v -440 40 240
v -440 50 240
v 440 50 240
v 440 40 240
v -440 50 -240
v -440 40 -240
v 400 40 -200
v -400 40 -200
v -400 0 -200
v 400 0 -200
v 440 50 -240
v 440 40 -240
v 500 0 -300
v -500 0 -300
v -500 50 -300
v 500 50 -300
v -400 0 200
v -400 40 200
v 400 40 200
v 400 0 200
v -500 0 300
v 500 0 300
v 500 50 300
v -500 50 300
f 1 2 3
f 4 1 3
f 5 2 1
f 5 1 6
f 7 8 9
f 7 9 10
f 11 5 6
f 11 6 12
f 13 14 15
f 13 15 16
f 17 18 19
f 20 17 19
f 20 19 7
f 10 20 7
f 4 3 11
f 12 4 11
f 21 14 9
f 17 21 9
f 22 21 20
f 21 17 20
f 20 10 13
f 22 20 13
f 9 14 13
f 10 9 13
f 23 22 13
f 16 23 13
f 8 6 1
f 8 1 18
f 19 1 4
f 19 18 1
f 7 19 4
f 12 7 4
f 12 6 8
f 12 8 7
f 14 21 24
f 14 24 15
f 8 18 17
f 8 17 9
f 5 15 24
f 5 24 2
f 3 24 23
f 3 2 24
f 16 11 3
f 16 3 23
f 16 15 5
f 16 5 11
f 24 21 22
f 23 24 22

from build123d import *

# Parameters (mm, degrees)
SKETCH1_W           = 1000
SKETCH1_H           = 600
BOSS_EXTRUDE1_DEPTH = 50
SKETCH2_W           = 800
SKETCH2_H           = 400
CUT_EXTRUDE1_DEPTH  = 51
SKETCH3_W           = 880
SKETCH3_H           = 480
CUT_EXTRUDE2_DEPTH  = 10


with BuildPart() as part:
    # Sketch1 → Boss-Extrude1 (new body)
    with BuildSketch(Plane(origin=(0, 0, 0), x_dir=(1, 0, 0), z_dir=(0, 1, 0))):
        Rectangle(SKETCH1_W, SKETCH1_H)
    extrude(amount=BOSS_EXTRUDE1_DEPTH)

    # Sketch2 → Cut-Extrude1 (cut, through all)
    with BuildSketch(Plane(origin=(0, 50, 0), x_dir=(1, 0, 0), z_dir=(0, 1, 0))):
        Rectangle(SKETCH2_W, SKETCH2_H)
    extrude(amount=-CUT_EXTRUDE1_DEPTH, mode=Mode.SUBTRACT)

    # Sketch3 → Cut-Extrude2 (cut)
    with BuildSketch(Plane(origin=(0, 50, 0), x_dir=(1, 0, 0), z_dir=(0, 1, 0))):
        Rectangle(SKETCH3_W, SKETCH3_H)
    extrude(amount=-CUT_EXTRUDE2_DEPTH, mode=Mode.SUBTRACT)


solid = part.part
